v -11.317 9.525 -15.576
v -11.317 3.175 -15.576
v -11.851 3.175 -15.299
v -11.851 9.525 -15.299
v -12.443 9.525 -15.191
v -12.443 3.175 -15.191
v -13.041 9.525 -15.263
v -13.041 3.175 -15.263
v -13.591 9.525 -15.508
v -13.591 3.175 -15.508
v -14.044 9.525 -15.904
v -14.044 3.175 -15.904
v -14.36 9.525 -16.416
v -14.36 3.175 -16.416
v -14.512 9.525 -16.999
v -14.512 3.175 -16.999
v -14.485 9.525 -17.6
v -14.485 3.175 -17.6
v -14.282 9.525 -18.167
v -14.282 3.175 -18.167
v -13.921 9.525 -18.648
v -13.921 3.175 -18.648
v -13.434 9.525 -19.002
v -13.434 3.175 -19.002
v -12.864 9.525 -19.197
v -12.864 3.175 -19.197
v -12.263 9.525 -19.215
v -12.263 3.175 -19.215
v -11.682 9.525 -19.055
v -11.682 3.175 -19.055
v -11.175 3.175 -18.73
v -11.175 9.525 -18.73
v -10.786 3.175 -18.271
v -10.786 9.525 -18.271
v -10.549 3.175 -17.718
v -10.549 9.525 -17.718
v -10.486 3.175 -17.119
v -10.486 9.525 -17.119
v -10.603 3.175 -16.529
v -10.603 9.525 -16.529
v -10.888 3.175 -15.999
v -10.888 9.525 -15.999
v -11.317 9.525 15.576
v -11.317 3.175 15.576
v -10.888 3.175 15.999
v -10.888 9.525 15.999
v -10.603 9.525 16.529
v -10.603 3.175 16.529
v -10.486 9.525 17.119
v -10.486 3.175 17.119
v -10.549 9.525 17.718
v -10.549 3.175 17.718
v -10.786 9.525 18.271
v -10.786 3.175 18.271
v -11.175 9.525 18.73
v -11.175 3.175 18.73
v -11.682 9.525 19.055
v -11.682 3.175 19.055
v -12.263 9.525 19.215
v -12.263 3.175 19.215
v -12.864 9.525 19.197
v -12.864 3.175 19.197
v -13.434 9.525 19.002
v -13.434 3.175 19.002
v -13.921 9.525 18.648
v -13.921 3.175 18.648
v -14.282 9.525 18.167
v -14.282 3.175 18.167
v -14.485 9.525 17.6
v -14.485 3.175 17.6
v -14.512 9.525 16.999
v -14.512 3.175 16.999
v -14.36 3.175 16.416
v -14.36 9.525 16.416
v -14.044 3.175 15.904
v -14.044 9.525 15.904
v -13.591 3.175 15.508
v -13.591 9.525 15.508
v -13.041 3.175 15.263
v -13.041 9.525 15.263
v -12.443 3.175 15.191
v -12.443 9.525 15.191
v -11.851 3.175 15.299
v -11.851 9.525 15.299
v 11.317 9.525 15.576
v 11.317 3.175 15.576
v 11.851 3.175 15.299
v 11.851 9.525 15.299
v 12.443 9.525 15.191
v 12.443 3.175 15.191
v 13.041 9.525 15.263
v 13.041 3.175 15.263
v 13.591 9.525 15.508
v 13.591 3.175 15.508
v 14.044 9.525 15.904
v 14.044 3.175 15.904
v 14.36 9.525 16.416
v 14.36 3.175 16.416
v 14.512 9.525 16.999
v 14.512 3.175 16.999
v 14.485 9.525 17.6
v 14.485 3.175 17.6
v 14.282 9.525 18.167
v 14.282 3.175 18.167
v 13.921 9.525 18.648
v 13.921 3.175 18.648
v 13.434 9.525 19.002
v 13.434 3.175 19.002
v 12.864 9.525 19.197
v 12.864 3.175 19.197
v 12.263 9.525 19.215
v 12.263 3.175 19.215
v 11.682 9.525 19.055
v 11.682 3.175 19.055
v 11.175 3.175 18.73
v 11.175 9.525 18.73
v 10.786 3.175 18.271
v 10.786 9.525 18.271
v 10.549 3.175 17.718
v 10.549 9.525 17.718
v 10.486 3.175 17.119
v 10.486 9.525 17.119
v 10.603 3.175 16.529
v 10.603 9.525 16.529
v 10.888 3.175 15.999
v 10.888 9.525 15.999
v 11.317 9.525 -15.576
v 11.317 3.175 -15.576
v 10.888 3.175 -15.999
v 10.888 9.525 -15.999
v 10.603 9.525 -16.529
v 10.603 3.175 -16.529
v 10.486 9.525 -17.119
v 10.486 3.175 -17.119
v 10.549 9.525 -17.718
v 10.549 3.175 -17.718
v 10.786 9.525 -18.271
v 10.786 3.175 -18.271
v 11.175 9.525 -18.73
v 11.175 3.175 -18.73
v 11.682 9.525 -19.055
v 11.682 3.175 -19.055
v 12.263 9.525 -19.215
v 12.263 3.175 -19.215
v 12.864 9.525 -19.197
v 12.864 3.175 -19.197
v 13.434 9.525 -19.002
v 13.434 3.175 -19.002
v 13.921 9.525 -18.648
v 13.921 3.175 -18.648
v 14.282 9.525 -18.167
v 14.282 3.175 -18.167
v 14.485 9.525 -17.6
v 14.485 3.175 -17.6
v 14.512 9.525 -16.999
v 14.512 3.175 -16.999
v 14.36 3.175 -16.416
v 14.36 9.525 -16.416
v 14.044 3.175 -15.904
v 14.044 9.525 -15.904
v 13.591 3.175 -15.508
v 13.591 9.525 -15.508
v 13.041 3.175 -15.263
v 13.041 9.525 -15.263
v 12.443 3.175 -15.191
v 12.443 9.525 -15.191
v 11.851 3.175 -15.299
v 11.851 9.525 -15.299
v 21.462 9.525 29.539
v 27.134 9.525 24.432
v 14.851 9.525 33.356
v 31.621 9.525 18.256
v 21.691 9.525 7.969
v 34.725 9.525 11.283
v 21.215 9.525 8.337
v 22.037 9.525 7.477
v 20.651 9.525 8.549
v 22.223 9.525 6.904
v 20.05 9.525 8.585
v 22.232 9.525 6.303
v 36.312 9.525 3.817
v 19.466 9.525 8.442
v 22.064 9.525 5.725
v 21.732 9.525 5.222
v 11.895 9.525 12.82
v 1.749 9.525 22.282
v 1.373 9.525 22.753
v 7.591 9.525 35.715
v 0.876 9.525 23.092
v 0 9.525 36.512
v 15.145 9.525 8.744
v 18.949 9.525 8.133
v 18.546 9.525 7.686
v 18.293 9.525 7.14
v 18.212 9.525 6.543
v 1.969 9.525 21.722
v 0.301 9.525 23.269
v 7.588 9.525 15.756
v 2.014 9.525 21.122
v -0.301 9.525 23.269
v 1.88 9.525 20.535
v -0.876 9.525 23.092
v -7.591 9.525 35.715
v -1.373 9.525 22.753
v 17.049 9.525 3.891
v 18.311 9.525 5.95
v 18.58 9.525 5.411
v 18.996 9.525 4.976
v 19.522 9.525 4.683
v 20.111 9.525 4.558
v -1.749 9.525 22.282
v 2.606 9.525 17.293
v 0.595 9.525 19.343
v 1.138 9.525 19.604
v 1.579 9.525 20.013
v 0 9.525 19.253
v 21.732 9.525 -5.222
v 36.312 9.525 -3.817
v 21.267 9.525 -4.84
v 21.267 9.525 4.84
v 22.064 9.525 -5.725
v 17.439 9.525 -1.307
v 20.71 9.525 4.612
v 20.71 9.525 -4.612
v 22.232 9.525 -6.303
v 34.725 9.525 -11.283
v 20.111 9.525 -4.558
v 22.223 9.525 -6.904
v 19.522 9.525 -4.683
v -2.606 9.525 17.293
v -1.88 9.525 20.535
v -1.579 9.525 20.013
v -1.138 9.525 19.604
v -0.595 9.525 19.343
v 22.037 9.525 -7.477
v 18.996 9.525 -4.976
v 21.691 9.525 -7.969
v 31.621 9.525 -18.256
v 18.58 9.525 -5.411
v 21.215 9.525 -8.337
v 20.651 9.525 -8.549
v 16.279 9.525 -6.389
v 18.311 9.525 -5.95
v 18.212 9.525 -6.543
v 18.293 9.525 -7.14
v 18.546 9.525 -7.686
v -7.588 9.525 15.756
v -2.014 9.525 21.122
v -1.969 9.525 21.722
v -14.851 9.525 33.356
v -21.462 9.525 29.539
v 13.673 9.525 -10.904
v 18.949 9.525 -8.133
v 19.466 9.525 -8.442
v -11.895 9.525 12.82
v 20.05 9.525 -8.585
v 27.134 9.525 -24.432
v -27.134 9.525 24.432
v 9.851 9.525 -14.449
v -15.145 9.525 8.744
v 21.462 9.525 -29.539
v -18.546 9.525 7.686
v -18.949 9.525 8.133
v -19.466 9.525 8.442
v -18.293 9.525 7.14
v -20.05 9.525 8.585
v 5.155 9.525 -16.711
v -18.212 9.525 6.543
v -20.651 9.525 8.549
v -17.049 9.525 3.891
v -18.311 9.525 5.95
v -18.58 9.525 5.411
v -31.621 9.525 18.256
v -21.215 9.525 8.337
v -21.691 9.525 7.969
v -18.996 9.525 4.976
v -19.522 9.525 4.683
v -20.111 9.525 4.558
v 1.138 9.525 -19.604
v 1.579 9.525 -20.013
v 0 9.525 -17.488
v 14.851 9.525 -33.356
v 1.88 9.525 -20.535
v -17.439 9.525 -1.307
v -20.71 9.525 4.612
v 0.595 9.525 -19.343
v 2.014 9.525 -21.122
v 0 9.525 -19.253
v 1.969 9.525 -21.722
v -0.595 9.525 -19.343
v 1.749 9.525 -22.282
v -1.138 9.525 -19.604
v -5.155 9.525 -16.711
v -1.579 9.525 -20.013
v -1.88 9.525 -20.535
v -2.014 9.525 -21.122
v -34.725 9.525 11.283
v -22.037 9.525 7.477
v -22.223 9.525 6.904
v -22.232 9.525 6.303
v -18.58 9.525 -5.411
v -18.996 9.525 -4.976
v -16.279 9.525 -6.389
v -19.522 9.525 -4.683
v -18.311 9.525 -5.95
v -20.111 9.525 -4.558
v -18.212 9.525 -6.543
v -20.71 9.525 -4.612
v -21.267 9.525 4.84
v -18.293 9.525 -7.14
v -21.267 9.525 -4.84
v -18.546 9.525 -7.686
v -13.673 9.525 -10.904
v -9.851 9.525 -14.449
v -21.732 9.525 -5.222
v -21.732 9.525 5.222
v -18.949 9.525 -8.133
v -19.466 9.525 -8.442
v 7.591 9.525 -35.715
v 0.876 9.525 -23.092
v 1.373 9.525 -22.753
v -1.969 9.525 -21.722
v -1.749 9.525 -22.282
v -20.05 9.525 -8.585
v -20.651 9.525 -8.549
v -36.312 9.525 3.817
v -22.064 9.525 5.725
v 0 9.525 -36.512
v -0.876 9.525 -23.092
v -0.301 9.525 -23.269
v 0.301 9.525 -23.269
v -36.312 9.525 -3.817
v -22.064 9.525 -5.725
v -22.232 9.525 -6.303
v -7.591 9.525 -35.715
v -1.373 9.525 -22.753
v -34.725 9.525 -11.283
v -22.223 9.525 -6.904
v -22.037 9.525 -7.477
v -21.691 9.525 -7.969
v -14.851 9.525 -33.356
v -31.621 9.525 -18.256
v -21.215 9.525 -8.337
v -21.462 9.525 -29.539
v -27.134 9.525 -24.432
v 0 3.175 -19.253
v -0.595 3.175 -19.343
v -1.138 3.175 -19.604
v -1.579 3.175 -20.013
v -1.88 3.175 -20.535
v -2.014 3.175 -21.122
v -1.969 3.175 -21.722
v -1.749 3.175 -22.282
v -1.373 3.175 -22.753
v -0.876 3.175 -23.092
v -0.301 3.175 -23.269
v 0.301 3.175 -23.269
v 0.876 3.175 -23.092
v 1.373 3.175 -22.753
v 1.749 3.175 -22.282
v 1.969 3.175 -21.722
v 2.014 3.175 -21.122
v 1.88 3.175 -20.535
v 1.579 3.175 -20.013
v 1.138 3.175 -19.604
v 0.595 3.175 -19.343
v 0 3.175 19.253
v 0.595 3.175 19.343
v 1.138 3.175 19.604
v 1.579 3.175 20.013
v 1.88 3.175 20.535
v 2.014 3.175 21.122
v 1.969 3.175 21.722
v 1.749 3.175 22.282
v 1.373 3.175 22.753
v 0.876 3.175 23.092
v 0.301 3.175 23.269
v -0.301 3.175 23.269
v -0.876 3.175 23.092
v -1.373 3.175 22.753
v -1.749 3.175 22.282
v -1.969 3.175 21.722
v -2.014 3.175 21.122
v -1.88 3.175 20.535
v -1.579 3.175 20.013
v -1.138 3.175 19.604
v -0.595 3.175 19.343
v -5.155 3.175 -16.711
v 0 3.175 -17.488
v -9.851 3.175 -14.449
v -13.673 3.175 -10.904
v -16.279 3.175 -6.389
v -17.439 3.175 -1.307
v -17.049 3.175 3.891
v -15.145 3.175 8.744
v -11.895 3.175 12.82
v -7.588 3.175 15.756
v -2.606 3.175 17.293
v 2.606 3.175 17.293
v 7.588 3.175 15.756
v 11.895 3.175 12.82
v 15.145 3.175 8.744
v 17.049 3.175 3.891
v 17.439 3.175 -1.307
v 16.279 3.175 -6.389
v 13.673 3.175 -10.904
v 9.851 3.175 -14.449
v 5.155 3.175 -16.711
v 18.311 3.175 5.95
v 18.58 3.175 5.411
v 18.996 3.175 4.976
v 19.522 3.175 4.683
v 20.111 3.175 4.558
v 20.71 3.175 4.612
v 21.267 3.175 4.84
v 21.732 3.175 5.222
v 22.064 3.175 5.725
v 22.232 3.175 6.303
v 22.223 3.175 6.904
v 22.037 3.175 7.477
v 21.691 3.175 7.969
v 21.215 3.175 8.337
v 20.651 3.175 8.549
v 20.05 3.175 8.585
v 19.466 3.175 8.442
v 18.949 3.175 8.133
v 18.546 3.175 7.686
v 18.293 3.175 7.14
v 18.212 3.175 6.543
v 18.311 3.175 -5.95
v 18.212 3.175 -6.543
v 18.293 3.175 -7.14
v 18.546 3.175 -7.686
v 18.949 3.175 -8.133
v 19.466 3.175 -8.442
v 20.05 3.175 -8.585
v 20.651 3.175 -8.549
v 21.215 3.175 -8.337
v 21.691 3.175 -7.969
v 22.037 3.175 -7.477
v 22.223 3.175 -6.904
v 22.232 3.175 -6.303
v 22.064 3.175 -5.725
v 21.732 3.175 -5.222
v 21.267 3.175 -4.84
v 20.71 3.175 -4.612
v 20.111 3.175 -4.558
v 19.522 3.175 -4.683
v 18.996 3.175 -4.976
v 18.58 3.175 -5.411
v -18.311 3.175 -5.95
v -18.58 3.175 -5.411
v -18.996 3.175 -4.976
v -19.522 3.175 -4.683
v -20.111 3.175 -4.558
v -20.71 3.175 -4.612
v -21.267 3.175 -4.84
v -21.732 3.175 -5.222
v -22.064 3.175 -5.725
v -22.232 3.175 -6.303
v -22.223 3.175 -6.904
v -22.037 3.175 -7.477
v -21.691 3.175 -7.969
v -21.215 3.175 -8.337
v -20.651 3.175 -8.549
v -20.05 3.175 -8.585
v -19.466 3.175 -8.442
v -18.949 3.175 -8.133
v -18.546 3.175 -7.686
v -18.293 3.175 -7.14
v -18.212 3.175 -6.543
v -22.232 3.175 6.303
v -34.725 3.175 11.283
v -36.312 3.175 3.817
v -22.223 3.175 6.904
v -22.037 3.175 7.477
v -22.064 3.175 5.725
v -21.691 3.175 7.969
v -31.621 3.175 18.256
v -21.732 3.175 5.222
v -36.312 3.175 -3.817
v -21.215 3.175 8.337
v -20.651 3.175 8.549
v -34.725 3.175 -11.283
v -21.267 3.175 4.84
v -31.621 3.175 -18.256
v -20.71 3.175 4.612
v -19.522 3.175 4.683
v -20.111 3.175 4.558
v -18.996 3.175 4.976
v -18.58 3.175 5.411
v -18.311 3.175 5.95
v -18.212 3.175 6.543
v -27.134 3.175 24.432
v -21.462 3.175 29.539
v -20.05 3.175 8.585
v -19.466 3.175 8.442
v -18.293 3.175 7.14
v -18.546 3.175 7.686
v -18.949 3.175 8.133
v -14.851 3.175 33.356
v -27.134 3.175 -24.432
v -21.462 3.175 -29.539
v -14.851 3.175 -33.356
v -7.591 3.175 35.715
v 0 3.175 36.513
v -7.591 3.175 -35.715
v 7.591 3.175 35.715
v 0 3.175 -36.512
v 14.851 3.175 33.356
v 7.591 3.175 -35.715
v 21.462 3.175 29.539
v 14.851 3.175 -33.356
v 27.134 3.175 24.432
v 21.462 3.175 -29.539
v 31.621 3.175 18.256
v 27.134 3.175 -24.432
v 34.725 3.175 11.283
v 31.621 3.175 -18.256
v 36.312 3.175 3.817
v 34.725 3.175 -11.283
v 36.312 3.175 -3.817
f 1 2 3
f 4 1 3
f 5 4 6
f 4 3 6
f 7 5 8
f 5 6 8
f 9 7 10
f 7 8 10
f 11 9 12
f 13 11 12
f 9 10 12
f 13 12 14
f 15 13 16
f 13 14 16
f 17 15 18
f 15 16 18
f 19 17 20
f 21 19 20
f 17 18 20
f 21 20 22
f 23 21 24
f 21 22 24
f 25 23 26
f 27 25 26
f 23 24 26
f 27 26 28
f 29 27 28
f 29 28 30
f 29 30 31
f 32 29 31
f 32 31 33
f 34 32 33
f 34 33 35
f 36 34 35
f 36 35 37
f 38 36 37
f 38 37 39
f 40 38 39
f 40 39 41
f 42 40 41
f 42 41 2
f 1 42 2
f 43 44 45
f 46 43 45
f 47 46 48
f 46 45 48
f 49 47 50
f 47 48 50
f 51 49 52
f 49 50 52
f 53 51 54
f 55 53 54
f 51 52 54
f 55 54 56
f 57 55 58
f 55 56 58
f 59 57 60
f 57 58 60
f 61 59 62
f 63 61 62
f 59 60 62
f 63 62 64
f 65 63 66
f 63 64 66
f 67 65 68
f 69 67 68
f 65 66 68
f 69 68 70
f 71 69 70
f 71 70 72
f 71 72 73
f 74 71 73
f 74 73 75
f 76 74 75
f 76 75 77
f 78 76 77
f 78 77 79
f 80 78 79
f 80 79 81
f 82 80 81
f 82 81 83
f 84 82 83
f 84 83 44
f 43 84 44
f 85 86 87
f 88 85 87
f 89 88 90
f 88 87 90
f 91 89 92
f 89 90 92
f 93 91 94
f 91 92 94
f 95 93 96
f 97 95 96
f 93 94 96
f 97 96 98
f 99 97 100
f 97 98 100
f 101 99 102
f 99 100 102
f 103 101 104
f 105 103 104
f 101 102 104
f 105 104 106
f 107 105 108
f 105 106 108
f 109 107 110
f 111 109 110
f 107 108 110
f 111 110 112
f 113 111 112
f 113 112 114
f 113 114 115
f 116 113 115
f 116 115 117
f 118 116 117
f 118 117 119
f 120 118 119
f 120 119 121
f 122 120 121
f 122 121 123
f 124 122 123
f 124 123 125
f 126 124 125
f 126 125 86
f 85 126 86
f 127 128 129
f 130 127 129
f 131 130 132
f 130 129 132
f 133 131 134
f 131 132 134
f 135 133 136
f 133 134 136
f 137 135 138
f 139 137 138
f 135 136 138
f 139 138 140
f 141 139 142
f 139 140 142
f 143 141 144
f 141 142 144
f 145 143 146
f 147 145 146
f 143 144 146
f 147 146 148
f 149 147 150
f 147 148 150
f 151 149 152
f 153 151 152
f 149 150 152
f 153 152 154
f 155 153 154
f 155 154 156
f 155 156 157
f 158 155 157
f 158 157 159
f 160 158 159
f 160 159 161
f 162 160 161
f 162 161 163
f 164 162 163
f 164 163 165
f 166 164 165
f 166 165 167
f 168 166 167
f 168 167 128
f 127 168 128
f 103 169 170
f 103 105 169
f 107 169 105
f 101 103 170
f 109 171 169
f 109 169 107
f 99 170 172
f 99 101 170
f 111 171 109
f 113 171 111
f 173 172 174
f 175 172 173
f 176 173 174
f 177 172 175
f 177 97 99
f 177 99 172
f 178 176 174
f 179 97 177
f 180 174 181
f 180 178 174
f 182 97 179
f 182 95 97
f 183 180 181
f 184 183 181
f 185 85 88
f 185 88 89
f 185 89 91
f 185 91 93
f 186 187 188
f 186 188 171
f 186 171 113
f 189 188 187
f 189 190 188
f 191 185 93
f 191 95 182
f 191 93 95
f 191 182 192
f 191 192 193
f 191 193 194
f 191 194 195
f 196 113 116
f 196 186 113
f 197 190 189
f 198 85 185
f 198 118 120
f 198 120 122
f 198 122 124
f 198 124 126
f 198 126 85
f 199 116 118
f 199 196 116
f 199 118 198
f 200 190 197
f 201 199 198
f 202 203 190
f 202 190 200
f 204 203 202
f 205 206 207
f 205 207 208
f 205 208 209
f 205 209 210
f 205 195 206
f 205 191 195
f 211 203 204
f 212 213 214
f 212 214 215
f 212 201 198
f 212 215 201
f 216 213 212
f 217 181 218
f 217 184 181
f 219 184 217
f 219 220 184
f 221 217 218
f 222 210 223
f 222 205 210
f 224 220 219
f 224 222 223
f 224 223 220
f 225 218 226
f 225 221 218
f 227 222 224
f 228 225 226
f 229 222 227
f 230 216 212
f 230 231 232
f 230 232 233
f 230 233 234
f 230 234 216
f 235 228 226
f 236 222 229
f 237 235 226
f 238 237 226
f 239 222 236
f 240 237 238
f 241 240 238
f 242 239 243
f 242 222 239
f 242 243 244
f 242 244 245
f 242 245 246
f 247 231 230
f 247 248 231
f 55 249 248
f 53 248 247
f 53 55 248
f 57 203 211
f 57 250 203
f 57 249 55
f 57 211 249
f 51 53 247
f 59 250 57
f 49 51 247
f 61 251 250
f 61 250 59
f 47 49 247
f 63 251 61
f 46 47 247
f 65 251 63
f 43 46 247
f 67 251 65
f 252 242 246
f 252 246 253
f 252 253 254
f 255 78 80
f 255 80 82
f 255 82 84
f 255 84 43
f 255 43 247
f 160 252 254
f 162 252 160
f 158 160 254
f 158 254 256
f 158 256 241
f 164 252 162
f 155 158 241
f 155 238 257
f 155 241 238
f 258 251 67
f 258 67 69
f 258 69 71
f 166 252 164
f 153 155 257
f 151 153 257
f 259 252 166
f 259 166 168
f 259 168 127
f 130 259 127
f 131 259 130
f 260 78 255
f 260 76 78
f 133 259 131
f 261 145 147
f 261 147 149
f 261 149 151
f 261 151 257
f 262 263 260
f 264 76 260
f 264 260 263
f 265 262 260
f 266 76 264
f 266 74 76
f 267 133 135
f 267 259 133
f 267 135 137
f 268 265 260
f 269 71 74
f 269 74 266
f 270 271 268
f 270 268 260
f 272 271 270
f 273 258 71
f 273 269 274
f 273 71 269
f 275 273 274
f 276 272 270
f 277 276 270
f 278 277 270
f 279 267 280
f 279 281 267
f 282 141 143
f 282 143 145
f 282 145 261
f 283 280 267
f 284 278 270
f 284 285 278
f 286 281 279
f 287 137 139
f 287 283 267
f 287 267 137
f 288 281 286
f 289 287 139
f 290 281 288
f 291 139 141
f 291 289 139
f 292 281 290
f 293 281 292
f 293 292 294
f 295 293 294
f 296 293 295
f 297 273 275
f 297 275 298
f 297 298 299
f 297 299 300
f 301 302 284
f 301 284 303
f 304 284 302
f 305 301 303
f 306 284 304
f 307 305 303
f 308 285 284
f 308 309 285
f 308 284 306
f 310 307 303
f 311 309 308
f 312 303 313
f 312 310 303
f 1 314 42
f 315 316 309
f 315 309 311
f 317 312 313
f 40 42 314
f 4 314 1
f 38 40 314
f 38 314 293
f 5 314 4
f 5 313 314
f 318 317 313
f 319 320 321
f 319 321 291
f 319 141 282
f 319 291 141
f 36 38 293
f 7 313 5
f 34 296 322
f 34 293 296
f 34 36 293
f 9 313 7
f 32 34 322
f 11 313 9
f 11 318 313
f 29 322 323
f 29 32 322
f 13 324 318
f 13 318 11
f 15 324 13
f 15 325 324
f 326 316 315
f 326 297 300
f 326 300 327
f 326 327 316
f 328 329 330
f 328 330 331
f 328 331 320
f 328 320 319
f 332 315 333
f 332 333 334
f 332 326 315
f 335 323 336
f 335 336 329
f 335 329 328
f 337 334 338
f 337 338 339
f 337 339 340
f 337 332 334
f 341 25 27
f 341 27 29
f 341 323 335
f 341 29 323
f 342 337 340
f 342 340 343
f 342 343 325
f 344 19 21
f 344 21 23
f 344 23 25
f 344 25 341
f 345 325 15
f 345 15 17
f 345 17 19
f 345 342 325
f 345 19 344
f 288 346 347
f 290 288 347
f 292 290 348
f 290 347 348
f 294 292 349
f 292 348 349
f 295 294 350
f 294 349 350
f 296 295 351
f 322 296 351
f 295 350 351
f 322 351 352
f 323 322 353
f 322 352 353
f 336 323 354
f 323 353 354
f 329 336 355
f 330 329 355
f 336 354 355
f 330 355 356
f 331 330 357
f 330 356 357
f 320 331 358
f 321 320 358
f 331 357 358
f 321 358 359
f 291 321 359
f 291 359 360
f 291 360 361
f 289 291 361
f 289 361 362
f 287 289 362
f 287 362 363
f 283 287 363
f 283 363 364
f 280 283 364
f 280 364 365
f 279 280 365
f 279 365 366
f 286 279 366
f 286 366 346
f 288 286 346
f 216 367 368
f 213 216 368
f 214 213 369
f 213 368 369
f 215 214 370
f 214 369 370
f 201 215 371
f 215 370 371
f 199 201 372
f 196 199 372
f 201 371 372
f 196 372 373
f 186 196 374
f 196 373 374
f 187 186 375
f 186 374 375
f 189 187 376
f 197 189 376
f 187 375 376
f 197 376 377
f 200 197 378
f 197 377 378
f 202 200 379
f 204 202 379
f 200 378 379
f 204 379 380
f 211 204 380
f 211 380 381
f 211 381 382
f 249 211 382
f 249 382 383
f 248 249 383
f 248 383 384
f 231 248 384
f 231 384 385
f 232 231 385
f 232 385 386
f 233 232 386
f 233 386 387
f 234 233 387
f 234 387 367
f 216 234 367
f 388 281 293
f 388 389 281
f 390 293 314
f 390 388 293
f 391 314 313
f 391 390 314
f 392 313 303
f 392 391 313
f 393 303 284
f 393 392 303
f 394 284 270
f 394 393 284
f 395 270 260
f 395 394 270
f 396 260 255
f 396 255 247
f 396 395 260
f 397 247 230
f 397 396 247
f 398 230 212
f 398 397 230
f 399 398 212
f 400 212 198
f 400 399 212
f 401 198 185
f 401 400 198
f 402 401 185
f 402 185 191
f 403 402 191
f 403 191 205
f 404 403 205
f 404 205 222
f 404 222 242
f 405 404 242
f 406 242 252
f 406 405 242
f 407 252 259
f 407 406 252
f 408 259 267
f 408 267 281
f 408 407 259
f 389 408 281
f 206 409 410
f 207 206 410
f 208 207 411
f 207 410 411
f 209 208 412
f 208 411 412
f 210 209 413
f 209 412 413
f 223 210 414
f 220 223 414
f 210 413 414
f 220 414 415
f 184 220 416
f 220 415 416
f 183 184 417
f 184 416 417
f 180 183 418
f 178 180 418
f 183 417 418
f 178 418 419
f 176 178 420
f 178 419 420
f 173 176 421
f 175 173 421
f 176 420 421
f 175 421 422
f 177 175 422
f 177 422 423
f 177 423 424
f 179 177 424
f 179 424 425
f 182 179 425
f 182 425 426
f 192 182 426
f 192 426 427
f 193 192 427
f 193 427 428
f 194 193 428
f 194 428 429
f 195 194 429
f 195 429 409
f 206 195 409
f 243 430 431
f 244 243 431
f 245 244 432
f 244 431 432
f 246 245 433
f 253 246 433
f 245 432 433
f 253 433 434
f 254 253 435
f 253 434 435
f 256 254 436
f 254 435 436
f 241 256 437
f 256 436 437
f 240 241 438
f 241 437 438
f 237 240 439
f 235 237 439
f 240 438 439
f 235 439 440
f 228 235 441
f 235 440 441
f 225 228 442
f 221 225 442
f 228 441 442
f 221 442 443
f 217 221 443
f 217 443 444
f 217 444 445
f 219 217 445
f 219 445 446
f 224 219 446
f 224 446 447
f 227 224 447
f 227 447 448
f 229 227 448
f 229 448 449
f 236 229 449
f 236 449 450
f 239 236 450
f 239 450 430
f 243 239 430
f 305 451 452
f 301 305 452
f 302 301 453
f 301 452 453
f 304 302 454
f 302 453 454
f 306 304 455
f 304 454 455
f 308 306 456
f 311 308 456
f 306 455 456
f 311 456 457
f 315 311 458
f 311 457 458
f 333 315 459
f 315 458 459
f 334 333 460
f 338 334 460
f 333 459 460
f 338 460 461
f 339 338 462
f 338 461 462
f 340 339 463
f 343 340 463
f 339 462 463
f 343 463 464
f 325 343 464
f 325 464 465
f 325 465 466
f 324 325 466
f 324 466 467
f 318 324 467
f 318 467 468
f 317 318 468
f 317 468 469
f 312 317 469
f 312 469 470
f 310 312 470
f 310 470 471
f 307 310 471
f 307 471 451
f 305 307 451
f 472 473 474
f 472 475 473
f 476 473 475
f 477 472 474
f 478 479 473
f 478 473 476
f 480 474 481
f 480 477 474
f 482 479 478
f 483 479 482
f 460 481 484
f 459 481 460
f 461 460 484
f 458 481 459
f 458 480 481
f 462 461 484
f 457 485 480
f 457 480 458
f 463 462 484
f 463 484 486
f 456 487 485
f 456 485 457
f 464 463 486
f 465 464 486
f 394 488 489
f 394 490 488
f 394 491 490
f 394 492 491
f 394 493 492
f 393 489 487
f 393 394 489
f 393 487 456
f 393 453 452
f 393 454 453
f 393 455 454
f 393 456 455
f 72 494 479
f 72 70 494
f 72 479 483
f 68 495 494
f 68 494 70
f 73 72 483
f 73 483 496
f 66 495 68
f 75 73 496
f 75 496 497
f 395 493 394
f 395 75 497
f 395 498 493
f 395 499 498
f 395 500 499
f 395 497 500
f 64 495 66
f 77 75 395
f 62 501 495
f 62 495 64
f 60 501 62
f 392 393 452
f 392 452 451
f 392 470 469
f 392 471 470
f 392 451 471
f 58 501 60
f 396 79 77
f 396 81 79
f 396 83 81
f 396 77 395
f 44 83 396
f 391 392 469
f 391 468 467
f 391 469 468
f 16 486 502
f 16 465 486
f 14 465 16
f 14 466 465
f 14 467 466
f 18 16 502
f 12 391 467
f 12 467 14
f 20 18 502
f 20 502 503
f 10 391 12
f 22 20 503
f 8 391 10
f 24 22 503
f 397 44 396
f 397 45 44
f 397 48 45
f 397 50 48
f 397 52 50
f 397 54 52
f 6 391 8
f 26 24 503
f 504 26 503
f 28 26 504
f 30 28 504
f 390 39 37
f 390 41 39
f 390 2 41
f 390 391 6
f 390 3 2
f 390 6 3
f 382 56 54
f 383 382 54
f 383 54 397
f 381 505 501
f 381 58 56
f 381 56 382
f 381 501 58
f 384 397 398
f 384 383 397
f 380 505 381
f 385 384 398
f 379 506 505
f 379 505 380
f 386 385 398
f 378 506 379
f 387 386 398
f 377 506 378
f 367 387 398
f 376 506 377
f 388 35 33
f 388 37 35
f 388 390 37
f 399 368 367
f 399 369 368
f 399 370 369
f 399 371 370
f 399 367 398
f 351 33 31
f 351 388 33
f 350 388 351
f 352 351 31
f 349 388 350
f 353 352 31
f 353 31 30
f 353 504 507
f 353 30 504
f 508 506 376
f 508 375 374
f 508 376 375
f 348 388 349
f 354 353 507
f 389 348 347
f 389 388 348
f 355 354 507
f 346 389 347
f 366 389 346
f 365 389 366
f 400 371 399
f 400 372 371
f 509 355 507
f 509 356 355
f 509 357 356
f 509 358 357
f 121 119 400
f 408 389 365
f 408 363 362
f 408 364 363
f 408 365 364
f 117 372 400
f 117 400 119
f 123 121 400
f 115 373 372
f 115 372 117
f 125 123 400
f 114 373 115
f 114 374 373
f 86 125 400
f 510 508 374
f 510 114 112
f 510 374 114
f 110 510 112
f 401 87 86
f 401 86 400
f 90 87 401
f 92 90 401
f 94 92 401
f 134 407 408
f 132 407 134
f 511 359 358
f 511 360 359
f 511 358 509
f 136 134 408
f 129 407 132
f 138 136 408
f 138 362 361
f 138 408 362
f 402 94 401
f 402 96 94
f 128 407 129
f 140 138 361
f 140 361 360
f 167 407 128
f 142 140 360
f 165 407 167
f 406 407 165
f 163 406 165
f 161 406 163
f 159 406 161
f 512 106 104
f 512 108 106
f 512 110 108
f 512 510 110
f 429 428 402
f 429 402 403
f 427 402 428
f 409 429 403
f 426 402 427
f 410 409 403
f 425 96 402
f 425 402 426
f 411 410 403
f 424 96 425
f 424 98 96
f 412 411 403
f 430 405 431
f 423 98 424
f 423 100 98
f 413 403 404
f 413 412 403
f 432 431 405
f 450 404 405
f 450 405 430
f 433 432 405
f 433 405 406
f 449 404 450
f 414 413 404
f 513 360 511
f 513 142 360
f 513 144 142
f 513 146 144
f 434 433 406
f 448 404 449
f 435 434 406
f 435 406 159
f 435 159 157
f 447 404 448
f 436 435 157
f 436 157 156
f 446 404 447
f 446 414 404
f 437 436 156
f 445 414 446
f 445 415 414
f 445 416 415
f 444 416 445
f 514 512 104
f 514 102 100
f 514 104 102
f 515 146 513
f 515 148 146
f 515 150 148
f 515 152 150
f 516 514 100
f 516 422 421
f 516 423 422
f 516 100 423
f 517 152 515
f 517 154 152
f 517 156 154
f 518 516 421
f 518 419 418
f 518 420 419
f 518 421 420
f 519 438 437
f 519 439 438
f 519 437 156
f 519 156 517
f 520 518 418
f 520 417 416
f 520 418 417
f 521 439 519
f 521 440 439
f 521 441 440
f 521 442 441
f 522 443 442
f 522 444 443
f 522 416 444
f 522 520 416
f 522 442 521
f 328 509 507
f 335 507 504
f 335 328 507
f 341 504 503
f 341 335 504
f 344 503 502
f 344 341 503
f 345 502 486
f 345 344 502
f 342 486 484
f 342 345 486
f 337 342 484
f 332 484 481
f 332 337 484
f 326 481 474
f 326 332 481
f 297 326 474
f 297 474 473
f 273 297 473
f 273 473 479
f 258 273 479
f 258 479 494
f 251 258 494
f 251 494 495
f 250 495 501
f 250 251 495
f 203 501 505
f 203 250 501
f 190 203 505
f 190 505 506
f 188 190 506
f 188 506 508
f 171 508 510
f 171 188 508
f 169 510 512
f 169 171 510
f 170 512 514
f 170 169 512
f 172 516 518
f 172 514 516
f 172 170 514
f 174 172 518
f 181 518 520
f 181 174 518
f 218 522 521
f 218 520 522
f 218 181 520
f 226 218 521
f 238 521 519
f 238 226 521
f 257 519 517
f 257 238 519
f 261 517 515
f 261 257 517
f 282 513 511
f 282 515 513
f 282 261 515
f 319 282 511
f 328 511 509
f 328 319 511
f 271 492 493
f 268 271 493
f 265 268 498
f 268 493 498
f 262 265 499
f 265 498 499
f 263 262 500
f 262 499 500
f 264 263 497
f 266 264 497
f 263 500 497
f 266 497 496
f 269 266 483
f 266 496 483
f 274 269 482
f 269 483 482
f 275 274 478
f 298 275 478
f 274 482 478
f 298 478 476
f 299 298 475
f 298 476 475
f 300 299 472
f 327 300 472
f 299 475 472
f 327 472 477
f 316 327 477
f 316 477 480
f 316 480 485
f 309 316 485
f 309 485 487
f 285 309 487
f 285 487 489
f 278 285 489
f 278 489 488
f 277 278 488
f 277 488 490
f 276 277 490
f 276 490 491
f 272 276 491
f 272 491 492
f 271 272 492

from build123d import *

# Parameters (mm, degrees)
SKETCH1_R            = 36.5125
SKETCH1_R_2          = 17.4879
BOSS_EXTRUDE1_DEPTH  = 9.525
SKETCH2_R            = 17.4879
SKETCH2_R_2          = 12.7
BOSS_EXTRUDE2_DEPTH  = 9.525
SKETCH3_R            = 2.0193
CUT_EXTRUDE1_DEPTH   = 56.038421239
SKETCH4_W            = 4.7625
SKETCH4_H            = 9.525
CUT_EXTRUDE2_START   = -12.7
SKETCH5_R            = 2.4892
CUT_EXTRUDE2_DEPTH   = 12.7
CIRPATTERN1_COUNT    = 10
SPLIT1_START         = -9.525
SPLIT1_OUTLINE_R     = 36.5125
SPLIT1_OUTLINE_R_2   = 2.4892
SPLIT1_OUTLINE_R_3   = 12.7
SPLIT1_DEPTH         = 12.7
SPLIT1_START_2       = -6.35
SPLIT1_2_OUTLINE_R   = 31.75
SPLIT1_2_OUTLINE_R_2 = 2.4892
SPLIT1_2_OUTLINE_R_3 = 12.7
SPLIT1_2_DEPTH       = 6.35
SPLIT1_3_OUTLINE_R   = 31.75
SPLIT1_3_OUTLINE_R_2 = 2.4892
SPLIT1_3_OUTLINE_R_3 = 17.4879
SPLIT1_3_DEPTH       = 3.175
SPLIT1_4_OUTLINE_R   = 36.5125
SPLIT1_4_OUTLINE_R_2 = 2.4892
SPLIT1_4_OUTLINE_R_3 = 12.7
SPLIT1_4_DEPTH       = 3.175


# Read off the part's stored shape, not the designer's step: Split1
with BuildPart() as part:
    # Sketch1 → Boss-Extrude1 (new, symmetric)
    with BuildSketch(Plane(origin=(0, 0, 0), x_dir=(1, 0, 0), z_dir=(0, 1, 0))):
        with Locations(Location((0, 0, 0), (0, 0, 90))):
            Circle(SKETCH1_R)
        with Locations(Location((0, 0, 0), (0, 0, 90))):
            Circle(SKETCH1_R_2, mode=Mode.SUBTRACT)
    extrude(amount=BOSS_EXTRUDE1_DEPTH, both=True)

    # Sketch2 → Boss-Extrude2 (add)
    with BuildSketch(Plane.XZ.offset(9.525)):
        with Locations(Location((0, 0, 0), (0, 0, 270))):
            Circle(SKETCH2_R)
        with Locations(Location((0, 0, 0), (0, 0, 270))):
            Circle(SKETCH2_R_2, mode=Mode.SUBTRACT)
    extrude(amount=-BOSS_EXTRUDE2_DEPTH)

    # Sketch3 → Cut-Extrude1 (cut, through all)
    with BuildSketch(Plane.XZ.offset(9.525)):
        with Locations(Location((0, 21.2725, 0), (0, 0, 270))):
            Circle(SKETCH3_R)
    cut_extrude1 = extrude(amount=-CUT_EXTRUDE1_DEPTH, mode=Mode.SUBTRACT)

    # Sketch4 → Cut-Revolve1 (revolve, cut)
    with BuildSketch(Plane(origin=(0, 0, 0), x_dir=(0, 0, -1), z_dir=(1, 0, 0)), mode=Mode.PRIVATE) as cut_revolve1_sk:
        with Locations((-34.13125, -1.5875)):
            Rectangle(SKETCH4_W, SKETCH4_H)
    revolve(cut_revolve1_sk.sketch.rotate(Axis((0, 0, 0), (0, 1, 0)), 180), axis=Axis((0, 0, 0), (0, 1, 0)), mode=Mode.SUBTRACT)

    # Sketch5 → Cut-Extrude2 (cut)
    with BuildSketch(Plane.XZ.offset(9.525).offset(CUT_EXTRUDE2_START)):
        with Locations(Location((0, 21.2725, 0), (0, 0, 270))):
            Circle(SKETCH5_R)
    cut_extrude2 = extrude(amount=CUT_EXTRUDE2_DEPTH, mode=Mode.SUBTRACT)

    # CirPattern1: Cut-Extrude1, Cut-Extrude2 ×10 about axis
    cirpattern1_axis = Axis((0, 0, 0), (0, 1, 0))
    add([cut_extrude1.rotate(cirpattern1_axis, i * 360 / CIRPATTERN1_COUNT) for i in range(1, CIRPATTERN1_COUNT)], mode=Mode.SUBTRACT)
    add([cut_extrude2.rotate(cirpattern1_axis, i * 360 / CIRPATTERN1_COUNT) for i in range(1, CIRPATTERN1_COUNT)], mode=Mode.SUBTRACT)

    # Split1 outline → Split1 (cut)
    with BuildSketch(Plane(origin=(0, 0, 0), x_dir=(1, 0, 0), z_dir=(0, 1, 0)).offset(SPLIT1_START)):
        Circle(SPLIT1_OUTLINE_R)
        with Locations((0, 21.2725)):
            Circle(SPLIT1_OUTLINE_R_2, mode=Mode.SUBTRACT)
        with Locations((-20.231349743, -6.573564013)):
            Circle(SPLIT1_OUTLINE_R_2, mode=Mode.SUBTRACT)
        with Locations((-12.503661779, -17.209814013)):
            Circle(SPLIT1_OUTLINE_R_2, mode=Mode.SUBTRACT)
        with Locations((0, -21.2725)):
            Circle(SPLIT1_OUTLINE_R_2, mode=Mode.SUBTRACT)
        with Locations((12.503661779, -17.209814013)):
            Circle(SPLIT1_OUTLINE_R_2, mode=Mode.SUBTRACT)
        with Locations((20.231349743, -6.573564013)):
            Circle(SPLIT1_OUTLINE_R_2, mode=Mode.SUBTRACT)
        with Locations((-20.231349743, 6.573564013)):
            Circle(SPLIT1_OUTLINE_R_2, mode=Mode.SUBTRACT)
        with Locations((-12.503661779, 17.209814013)):
            Circle(SPLIT1_OUTLINE_R_2, mode=Mode.SUBTRACT)
        with Locations((12.503661779, 17.209814013)):
            Circle(SPLIT1_OUTLINE_R_2, mode=Mode.SUBTRACT)
        with Locations((20.231349743, 6.573564013)):
            Circle(SPLIT1_OUTLINE_R_2, mode=Mode.SUBTRACT)
        Circle(SPLIT1_OUTLINE_R_3, mode=Mode.SUBTRACT)
    extrude(amount=SPLIT1_DEPTH, mode=Mode.SUBTRACT)


with BuildPart() as body_2:
    # Split1 2 outline → Split1 2 (new body)
    with BuildSketch(Plane(origin=(0, 0, 0), x_dir=(1, 0, 0), z_dir=(0, 1, 0)).offset(SPLIT1_START_2)):
        Circle(SPLIT1_2_OUTLINE_R)
        with Locations((-12.503661779, -17.209814013)):
            Circle(SPLIT1_2_OUTLINE_R_2, mode=Mode.SUBTRACT)
        with Locations((-20.231349743, -6.573564013)):
            Circle(SPLIT1_2_OUTLINE_R_2, mode=Mode.SUBTRACT)
        with Locations((0, -21.2725)):
            Circle(SPLIT1_2_OUTLINE_R_2, mode=Mode.SUBTRACT)
        with Locations((12.503661779, -17.209814013)):
            Circle(SPLIT1_2_OUTLINE_R_2, mode=Mode.SUBTRACT)
        with Locations((20.231349743, -6.573564013)):
            Circle(SPLIT1_2_OUTLINE_R_2, mode=Mode.SUBTRACT)
        with Locations((-20.231349743, 6.573564013)):
            Circle(SPLIT1_2_OUTLINE_R_2, mode=Mode.SUBTRACT)
        with Locations((-12.503661779, 17.209814013)):
            Circle(SPLIT1_2_OUTLINE_R_2, mode=Mode.SUBTRACT)
        Circle(SPLIT1_2_OUTLINE_R_3, mode=Mode.SUBTRACT)
        with Locations((20.231349743, 6.573564013)):
            Circle(SPLIT1_2_OUTLINE_R_2, mode=Mode.SUBTRACT)
        with Locations((0, 21.2725)):
            Circle(SPLIT1_2_OUTLINE_R_2, mode=Mode.SUBTRACT)
        with Locations((12.503661779, 17.209814013)):
            Circle(SPLIT1_2_OUTLINE_R_2, mode=Mode.SUBTRACT)
    extrude(amount=SPLIT1_2_DEPTH)


with BuildPart() as body_3:
    # Split1 3 outline → Split1 3 (new body)
    with BuildSketch(Plane(origin=(0, 0, 0), x_dir=(1, 0, 0), z_dir=(0, 1, 0))):
        Circle(SPLIT1_3_OUTLINE_R)
        with Locations((-12.503661779, -17.209814013)):
            Circle(SPLIT1_3_OUTLINE_R_2, mode=Mode.SUBTRACT)
        with Locations((-20.231349743, -6.573564013)):
            Circle(SPLIT1_3_OUTLINE_R_2, mode=Mode.SUBTRACT)
        with Locations((0, -21.2725)):
            Circle(SPLIT1_3_OUTLINE_R_2, mode=Mode.SUBTRACT)
        with Locations((12.503661779, -17.209814013)):
            Circle(SPLIT1_3_OUTLINE_R_2, mode=Mode.SUBTRACT)
        with Locations((20.231349743, -6.573564013)):
            Circle(SPLIT1_3_OUTLINE_R_2, mode=Mode.SUBTRACT)
        with Locations((-20.231349743, 6.573564013)):
            Circle(SPLIT1_3_OUTLINE_R_2, mode=Mode.SUBTRACT)
        with Locations((-12.503661779, 17.209814013)):
            Circle(SPLIT1_3_OUTLINE_R_2, mode=Mode.SUBTRACT)
        Circle(SPLIT1_3_OUTLINE_R_3, mode=Mode.SUBTRACT)
        with Locations((20.231349743, 6.573564013)):
            Circle(SPLIT1_3_OUTLINE_R_2, mode=Mode.SUBTRACT)
        with Locations((0, 21.2725)):
            Circle(SPLIT1_3_OUTLINE_R_2, mode=Mode.SUBTRACT)
        with Locations((12.503661779, 17.209814013)):
            Circle(SPLIT1_3_OUTLINE_R_2, mode=Mode.SUBTRACT)
    extrude(amount=SPLIT1_3_DEPTH)


with BuildPart() as body_4:
    # Split1 4 outline → Split1 4 (new body)
    with BuildSketch(Plane(origin=(0, 0, 0), x_dir=(1, 0, 0), z_dir=(0, 1, 0)).offset(SPLIT1_START)):
        Circle(SPLIT1_4_OUTLINE_R)
        with Locations((-20.231349743, -6.573564013)):
            Circle(SPLIT1_4_OUTLINE_R_2, mode=Mode.SUBTRACT)
        with Locations((-12.503661779, -17.209814013)):
            Circle(SPLIT1_4_OUTLINE_R_2, mode=Mode.SUBTRACT)
        with Locations((0, -21.2725)):
            Circle(SPLIT1_4_OUTLINE_R_2, mode=Mode.SUBTRACT)
        with Locations((12.503661779, -17.209814013)):
            Circle(SPLIT1_4_OUTLINE_R_2, mode=Mode.SUBTRACT)
        with Locations((20.231349743, -6.573564013)):
            Circle(SPLIT1_4_OUTLINE_R_2, mode=Mode.SUBTRACT)
        with Locations((-20.231349743, 6.573564013)):
            Circle(SPLIT1_4_OUTLINE_R_2, mode=Mode.SUBTRACT)
        with Locations((-12.503661779, 17.209814013)):
            Circle(SPLIT1_4_OUTLINE_R_2, mode=Mode.SUBTRACT)
        Circle(SPLIT1_4_OUTLINE_R_3, mode=Mode.SUBTRACT)
        with Locations((12.503661779, 17.209814013)):
            Circle(SPLIT1_4_OUTLINE_R_2, mode=Mode.SUBTRACT)
        with Locations((20.231349743, 6.573564013)):
            Circle(SPLIT1_4_OUTLINE_R_2, mode=Mode.SUBTRACT)
        with Locations((0, 21.2725)):
            Circle(SPLIT1_4_OUTLINE_R_2, mode=Mode.SUBTRACT)
    extrude(amount=SPLIT1_4_DEPTH)


solid = part.part
